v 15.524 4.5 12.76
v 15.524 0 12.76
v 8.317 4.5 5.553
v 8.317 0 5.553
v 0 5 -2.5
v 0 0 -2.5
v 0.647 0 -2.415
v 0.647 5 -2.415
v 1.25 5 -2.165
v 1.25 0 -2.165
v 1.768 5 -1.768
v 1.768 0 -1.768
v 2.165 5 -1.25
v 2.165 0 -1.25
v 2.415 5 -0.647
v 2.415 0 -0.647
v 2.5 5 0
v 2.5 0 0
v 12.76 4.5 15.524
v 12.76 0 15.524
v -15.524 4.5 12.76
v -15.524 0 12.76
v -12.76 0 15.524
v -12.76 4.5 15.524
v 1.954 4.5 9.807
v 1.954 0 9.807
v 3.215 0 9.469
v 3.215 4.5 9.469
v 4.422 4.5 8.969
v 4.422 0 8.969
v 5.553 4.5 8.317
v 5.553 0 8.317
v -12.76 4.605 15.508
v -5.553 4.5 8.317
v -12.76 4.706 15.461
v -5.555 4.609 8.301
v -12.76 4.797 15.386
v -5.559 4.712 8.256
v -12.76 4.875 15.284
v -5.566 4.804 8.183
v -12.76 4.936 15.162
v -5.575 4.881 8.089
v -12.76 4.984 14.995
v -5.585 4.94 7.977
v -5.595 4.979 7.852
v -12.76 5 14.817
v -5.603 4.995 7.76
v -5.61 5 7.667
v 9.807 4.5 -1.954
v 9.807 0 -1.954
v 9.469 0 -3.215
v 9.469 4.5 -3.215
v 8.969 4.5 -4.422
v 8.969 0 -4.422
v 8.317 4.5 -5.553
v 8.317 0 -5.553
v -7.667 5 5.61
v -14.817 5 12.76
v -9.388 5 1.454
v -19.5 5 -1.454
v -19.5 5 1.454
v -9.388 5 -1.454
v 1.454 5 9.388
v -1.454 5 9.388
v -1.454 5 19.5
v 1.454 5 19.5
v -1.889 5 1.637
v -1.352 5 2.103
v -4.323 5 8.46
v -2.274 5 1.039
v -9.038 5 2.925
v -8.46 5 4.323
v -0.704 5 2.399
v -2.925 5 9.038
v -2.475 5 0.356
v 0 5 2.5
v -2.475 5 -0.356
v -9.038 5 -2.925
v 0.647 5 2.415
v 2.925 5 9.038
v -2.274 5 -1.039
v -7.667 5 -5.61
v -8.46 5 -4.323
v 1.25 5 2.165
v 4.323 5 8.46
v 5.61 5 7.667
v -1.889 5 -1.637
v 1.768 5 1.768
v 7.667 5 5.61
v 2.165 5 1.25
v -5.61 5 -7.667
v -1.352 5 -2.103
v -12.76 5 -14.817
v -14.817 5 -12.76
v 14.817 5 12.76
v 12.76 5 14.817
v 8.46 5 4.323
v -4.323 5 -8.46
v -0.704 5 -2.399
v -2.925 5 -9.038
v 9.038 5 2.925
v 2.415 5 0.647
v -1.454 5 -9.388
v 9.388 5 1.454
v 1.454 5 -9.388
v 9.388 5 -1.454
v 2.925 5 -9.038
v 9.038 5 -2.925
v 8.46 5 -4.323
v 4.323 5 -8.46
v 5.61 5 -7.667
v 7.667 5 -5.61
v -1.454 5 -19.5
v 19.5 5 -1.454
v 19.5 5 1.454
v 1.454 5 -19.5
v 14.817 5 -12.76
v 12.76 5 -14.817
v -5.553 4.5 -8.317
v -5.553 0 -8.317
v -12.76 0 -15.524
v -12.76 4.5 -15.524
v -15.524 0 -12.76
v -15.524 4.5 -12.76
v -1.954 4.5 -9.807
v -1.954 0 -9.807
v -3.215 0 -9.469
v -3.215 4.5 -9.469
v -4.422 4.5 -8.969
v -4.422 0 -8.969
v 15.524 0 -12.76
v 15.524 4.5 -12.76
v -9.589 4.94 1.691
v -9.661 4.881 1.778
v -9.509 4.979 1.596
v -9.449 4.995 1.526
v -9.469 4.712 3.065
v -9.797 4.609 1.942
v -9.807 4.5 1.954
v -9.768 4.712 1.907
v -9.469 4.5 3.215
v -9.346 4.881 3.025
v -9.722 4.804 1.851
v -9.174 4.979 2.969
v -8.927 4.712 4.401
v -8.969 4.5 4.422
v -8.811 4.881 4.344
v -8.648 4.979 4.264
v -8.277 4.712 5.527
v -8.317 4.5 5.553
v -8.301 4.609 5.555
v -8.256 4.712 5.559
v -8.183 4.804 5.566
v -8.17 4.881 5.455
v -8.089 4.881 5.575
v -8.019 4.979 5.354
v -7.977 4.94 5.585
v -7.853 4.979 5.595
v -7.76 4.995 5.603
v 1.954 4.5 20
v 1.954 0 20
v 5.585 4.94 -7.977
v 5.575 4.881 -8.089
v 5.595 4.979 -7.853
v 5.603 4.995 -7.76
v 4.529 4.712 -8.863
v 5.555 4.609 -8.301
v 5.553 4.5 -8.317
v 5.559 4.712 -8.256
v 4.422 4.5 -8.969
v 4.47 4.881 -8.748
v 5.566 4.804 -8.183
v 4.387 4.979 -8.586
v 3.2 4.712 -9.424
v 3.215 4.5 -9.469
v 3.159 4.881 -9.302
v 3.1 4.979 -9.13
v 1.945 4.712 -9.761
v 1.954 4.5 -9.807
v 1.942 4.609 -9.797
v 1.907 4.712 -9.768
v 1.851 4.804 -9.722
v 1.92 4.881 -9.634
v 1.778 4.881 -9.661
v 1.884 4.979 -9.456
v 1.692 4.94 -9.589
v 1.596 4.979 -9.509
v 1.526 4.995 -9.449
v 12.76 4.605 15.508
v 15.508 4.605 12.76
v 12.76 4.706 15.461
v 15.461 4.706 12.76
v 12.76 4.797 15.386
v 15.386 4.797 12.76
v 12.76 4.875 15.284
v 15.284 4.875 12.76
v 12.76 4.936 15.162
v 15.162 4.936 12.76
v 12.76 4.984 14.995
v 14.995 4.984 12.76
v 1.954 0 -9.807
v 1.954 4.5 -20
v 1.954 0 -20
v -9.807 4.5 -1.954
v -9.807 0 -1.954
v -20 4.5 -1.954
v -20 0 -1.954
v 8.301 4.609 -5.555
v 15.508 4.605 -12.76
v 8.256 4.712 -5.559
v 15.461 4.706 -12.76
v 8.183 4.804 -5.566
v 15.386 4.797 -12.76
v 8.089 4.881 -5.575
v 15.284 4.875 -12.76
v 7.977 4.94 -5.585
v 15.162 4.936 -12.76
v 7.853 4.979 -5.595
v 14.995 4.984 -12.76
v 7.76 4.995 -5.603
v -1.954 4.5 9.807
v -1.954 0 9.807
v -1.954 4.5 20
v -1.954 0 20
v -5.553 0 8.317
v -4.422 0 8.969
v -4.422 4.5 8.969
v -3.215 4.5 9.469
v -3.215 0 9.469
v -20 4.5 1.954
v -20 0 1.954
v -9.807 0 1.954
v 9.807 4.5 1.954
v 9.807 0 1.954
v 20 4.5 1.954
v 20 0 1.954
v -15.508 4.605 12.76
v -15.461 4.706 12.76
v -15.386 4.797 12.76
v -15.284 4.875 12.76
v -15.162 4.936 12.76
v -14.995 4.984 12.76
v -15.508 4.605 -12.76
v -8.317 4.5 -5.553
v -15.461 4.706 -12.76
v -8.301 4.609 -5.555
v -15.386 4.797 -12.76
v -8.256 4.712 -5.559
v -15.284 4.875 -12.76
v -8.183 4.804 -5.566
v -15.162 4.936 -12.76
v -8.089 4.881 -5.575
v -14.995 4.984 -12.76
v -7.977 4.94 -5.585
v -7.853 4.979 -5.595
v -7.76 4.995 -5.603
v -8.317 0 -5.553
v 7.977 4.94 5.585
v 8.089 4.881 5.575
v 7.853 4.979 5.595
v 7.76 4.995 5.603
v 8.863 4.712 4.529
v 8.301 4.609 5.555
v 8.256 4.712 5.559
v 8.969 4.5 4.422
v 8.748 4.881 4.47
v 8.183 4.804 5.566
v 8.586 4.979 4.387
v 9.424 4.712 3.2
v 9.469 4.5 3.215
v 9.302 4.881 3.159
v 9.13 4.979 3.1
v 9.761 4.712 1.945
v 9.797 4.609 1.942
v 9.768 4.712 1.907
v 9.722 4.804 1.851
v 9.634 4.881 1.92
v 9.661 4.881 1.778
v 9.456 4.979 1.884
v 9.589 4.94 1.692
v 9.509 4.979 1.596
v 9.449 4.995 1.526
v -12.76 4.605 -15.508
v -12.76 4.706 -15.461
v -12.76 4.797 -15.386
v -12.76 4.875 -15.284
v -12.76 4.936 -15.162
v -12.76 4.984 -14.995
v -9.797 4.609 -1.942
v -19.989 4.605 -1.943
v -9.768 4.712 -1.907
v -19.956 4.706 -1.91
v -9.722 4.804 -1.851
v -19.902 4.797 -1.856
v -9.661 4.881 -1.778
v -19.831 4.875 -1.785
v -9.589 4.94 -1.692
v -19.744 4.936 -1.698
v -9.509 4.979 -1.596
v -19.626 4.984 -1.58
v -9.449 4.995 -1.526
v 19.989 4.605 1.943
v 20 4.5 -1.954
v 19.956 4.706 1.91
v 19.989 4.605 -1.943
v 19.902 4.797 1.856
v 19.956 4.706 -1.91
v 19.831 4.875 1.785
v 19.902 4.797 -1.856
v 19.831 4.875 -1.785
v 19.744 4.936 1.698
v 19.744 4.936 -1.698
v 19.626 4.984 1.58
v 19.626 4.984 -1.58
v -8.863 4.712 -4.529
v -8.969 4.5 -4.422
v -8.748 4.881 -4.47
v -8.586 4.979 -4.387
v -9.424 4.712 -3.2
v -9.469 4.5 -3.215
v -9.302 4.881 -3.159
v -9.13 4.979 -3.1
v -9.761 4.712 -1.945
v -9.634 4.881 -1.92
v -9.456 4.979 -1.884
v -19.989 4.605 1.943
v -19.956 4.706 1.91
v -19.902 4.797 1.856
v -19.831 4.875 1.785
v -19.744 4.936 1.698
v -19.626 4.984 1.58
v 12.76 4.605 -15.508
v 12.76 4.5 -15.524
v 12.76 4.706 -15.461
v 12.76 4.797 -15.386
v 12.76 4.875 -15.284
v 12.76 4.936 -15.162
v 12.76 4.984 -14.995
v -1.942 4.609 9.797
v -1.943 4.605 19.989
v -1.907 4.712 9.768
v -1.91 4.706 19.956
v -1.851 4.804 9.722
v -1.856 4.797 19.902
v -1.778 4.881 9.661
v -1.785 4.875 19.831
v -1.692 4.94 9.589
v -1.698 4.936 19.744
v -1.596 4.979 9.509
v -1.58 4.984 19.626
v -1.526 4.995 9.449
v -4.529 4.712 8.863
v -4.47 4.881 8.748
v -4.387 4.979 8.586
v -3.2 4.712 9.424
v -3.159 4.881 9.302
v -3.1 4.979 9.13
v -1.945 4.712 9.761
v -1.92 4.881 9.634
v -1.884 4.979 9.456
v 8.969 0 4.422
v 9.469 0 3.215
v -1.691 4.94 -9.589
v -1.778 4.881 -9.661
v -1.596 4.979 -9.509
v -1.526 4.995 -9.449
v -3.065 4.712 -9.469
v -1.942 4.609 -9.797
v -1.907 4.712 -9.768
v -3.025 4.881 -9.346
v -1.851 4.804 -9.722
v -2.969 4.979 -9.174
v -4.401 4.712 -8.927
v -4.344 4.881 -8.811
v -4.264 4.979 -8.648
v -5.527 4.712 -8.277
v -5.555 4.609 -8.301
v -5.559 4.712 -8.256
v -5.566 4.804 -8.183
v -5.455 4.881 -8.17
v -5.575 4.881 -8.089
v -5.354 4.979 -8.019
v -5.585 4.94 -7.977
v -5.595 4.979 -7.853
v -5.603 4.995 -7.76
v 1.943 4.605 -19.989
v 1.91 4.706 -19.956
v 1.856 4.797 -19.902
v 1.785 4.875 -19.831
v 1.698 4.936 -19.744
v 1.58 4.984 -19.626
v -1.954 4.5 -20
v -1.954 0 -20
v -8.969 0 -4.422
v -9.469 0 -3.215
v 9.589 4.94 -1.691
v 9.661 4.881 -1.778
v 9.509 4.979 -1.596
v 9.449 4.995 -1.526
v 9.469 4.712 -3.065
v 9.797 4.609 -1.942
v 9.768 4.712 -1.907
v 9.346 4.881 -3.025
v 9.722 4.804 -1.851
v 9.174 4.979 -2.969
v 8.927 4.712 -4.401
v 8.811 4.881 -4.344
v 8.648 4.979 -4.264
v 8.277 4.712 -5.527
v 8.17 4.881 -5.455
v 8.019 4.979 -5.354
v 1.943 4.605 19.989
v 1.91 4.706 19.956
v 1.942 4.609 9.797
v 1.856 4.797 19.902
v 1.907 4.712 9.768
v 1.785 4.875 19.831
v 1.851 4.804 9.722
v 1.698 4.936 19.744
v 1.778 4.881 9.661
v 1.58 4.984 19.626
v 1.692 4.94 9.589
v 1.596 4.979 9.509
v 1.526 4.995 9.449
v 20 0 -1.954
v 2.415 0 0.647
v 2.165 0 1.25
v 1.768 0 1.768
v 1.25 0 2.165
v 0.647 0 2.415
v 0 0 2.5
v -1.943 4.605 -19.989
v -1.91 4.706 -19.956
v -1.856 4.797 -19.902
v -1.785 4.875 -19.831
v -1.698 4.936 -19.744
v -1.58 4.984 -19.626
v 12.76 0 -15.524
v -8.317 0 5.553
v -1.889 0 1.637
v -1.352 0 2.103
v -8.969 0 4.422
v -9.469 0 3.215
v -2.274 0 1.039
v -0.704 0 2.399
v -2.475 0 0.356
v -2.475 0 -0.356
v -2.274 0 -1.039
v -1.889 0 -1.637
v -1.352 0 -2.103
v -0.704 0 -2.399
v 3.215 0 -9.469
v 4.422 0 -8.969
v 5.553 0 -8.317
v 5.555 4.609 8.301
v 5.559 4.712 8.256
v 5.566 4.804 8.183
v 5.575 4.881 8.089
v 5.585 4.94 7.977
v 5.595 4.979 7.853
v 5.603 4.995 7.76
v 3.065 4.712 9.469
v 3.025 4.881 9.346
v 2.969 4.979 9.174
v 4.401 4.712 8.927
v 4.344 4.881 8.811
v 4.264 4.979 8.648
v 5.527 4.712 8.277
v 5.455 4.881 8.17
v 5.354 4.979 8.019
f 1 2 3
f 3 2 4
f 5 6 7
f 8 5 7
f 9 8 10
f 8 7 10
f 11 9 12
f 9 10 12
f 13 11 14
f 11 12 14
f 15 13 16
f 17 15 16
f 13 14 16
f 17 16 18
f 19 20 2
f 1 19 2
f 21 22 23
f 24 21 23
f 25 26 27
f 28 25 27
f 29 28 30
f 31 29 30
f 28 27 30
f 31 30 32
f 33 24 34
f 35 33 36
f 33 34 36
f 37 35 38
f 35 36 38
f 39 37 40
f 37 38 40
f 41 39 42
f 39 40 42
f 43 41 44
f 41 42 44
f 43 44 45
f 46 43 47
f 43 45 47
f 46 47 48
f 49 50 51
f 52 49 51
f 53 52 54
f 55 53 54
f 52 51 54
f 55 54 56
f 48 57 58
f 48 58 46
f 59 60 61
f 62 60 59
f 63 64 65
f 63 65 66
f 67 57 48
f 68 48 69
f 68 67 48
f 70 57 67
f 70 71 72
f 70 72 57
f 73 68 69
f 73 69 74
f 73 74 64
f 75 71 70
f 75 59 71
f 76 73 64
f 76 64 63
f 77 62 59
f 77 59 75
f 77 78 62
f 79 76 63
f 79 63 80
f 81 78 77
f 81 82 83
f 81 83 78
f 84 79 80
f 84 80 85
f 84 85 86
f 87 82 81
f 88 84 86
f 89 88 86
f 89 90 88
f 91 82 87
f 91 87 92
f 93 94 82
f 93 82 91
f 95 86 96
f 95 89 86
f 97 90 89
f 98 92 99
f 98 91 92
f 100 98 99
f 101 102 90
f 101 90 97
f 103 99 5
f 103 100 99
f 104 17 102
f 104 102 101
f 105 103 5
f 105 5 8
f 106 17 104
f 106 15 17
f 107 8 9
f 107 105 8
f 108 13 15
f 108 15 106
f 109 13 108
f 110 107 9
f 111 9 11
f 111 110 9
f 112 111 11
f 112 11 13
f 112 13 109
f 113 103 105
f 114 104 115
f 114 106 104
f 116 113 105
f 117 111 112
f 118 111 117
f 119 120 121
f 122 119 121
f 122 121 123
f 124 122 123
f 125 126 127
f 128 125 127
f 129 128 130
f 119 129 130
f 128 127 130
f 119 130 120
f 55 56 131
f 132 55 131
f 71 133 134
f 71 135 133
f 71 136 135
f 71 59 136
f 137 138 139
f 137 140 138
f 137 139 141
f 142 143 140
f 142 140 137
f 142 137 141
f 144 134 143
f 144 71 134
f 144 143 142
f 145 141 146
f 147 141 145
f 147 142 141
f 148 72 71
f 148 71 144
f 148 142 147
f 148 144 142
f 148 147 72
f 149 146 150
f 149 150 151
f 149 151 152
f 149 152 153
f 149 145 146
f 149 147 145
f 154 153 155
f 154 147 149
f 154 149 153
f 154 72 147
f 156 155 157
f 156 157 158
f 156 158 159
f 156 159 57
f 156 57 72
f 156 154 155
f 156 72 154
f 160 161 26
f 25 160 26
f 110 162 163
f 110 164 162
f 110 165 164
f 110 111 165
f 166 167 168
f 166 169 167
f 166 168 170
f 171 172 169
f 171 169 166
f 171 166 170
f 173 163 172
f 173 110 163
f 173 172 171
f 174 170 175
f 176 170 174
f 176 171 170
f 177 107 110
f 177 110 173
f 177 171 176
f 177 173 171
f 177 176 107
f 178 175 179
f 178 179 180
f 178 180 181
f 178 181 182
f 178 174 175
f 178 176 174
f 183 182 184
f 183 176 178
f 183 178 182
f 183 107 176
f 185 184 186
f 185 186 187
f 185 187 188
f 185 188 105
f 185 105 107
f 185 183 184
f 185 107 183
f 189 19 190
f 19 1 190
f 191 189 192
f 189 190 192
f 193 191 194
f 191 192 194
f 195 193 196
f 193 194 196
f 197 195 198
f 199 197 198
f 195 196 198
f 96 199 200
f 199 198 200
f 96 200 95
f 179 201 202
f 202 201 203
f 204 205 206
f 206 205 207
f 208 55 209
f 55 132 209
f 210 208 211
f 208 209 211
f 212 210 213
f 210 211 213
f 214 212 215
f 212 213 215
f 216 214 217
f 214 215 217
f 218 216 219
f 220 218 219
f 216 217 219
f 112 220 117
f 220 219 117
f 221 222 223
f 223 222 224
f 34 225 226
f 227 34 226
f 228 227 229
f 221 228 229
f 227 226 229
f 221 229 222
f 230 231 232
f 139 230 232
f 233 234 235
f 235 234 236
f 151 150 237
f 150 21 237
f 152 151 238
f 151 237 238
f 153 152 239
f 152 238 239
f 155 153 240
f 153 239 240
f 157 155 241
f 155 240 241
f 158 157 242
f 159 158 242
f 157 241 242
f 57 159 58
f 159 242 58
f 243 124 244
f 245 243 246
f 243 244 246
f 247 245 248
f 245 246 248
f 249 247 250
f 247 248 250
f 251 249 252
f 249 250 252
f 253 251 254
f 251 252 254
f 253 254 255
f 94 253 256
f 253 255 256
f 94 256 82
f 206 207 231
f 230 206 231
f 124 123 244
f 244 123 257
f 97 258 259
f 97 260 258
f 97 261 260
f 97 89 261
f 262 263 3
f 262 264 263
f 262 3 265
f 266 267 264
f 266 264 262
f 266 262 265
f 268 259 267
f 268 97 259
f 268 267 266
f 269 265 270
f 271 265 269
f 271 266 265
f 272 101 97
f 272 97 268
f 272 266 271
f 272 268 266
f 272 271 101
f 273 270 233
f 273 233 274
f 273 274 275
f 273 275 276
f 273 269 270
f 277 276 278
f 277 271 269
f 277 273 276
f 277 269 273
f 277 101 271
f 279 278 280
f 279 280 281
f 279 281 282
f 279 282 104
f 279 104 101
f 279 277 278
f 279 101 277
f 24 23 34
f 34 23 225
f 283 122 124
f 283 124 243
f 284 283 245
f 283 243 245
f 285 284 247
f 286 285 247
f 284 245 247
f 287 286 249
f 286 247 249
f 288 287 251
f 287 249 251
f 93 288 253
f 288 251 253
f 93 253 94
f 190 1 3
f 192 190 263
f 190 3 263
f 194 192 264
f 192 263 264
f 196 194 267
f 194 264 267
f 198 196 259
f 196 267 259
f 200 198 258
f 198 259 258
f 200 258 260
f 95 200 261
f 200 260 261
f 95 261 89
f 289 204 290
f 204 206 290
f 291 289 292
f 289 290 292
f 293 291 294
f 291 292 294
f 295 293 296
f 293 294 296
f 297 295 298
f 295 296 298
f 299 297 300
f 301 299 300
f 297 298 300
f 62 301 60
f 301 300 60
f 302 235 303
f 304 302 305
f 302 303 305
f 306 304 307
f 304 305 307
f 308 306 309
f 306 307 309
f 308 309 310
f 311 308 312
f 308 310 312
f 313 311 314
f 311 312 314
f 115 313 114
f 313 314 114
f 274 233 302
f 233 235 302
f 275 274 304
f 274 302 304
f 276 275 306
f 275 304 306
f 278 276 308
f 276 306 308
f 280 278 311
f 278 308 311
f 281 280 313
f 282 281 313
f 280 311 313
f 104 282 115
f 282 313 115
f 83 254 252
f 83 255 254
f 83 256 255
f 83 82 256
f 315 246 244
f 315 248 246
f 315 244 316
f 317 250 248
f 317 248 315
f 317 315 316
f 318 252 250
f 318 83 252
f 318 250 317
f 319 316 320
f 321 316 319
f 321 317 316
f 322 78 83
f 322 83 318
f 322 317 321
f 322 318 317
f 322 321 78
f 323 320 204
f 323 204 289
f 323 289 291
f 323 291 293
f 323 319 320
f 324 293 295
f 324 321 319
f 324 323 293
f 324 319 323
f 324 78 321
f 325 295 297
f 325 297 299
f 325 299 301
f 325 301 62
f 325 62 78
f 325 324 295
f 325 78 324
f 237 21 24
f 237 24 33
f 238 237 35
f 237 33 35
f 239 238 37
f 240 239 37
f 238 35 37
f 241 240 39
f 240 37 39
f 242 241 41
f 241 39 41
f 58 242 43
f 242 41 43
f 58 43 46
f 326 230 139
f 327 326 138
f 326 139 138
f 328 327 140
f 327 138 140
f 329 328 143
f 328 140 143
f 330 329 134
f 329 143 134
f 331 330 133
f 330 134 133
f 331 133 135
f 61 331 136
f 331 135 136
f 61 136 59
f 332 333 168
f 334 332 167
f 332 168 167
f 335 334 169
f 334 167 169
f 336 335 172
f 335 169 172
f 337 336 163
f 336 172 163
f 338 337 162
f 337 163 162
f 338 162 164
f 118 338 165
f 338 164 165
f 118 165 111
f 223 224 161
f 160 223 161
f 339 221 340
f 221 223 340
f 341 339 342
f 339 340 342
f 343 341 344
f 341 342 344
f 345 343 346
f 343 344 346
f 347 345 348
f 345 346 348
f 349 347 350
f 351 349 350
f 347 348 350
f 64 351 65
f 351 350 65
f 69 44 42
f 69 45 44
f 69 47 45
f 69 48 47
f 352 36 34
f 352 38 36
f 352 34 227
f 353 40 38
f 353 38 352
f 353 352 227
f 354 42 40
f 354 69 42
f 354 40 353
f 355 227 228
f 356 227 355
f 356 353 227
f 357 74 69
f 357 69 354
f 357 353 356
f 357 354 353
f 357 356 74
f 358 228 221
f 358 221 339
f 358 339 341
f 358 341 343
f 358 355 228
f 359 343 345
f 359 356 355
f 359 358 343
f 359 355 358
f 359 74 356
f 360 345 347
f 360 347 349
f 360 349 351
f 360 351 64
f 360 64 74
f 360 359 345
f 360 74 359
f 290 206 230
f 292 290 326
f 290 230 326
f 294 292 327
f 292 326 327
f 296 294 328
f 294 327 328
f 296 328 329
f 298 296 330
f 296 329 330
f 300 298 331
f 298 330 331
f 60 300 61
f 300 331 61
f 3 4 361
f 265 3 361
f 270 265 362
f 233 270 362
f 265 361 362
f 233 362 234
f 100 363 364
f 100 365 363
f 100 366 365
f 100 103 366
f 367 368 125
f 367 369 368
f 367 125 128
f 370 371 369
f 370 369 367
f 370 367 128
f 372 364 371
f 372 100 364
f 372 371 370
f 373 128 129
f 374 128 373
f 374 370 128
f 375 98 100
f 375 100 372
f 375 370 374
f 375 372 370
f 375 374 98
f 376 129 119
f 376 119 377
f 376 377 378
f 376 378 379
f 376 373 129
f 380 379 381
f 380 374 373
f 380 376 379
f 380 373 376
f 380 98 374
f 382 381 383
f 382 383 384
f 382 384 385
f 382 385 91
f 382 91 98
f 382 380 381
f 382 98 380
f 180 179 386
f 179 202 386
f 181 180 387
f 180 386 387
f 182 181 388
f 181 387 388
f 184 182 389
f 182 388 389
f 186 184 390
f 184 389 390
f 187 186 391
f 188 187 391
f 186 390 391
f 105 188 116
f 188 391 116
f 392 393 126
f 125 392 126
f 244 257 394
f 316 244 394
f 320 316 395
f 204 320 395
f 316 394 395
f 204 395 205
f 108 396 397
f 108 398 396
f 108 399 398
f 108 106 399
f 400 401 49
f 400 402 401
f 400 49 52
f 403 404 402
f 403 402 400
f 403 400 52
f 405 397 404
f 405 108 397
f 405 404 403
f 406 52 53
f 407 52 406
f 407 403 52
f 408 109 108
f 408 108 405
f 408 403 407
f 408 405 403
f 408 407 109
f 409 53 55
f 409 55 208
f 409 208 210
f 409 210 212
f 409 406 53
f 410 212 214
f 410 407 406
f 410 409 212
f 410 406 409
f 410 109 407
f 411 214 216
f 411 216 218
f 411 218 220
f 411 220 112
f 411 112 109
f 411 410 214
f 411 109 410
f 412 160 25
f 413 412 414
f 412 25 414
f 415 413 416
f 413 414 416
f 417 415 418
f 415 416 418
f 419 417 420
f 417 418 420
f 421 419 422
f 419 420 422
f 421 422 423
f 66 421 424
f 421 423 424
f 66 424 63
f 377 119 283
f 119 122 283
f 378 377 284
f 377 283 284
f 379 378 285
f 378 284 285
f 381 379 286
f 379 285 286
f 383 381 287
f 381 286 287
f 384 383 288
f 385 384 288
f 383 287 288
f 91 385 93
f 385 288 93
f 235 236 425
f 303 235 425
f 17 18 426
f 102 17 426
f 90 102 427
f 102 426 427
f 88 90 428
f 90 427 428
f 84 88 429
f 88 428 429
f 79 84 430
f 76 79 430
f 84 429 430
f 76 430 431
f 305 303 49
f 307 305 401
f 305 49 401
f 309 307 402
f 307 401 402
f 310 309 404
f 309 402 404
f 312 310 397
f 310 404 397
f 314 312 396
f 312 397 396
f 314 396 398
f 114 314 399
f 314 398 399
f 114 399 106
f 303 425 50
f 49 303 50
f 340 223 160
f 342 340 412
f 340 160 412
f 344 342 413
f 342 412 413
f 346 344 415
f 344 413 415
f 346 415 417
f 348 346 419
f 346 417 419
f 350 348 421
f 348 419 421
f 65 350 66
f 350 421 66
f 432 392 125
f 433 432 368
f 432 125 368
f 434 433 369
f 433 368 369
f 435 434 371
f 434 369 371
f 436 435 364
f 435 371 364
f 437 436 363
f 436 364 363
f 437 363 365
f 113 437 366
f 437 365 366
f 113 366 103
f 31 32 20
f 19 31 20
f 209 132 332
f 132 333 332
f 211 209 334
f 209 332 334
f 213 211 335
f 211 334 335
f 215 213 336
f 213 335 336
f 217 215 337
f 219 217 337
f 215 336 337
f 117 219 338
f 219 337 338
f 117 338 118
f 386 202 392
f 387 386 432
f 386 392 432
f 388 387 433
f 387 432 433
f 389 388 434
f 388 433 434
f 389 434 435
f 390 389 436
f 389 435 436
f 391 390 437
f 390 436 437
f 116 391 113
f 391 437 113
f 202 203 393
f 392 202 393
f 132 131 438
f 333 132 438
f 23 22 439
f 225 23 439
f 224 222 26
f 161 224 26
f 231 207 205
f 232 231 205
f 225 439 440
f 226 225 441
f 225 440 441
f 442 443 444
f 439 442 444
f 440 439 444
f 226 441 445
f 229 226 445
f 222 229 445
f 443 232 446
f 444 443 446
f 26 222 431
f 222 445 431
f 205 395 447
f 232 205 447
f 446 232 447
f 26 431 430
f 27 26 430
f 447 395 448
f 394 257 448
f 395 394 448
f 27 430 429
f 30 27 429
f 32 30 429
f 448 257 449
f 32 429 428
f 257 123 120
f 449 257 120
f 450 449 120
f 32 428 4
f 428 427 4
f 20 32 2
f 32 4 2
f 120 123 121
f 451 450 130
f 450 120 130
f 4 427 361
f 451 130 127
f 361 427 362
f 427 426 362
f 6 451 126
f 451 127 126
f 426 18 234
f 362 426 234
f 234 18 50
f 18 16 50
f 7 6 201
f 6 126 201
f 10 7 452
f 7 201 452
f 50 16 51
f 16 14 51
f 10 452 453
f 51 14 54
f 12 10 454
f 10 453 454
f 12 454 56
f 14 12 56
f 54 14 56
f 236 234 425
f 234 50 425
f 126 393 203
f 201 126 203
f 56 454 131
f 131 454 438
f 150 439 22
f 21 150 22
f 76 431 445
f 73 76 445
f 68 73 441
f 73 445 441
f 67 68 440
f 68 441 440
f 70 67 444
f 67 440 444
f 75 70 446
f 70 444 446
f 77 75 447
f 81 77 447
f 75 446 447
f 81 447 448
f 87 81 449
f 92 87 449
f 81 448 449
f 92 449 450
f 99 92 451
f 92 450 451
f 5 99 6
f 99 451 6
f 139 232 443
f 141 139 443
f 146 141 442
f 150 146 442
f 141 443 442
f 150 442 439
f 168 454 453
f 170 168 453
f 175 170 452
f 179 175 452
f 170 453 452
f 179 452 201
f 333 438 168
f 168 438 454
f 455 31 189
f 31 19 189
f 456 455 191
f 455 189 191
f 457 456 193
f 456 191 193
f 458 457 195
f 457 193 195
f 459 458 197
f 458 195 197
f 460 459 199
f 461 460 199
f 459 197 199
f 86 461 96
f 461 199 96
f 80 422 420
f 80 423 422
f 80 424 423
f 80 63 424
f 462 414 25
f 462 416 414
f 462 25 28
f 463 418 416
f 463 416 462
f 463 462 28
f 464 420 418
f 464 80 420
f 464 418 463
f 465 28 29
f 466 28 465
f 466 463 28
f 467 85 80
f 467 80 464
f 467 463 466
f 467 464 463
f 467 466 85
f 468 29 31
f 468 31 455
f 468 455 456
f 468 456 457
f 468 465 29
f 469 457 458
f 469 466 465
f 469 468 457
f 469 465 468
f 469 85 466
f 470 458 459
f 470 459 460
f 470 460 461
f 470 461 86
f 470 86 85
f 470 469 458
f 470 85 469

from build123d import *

# Parameters (mm, degrees)
EXTRUDE_1_DEPTH = 5
FILLET_1_R      = 0.5


with BuildPart() as part:
    # 草图1 → 凸台-拉伸1 (new body)
    with BuildSketch(Plane(origin=(0, 0, 0), x_dir=(1, 0, 0), z_dir=(0, 1, 0))):
        with BuildLine():
            ThreePointArc((-8.316516862, 5.552976435), (-7.071067812, 7.071067812), (-5.552976435, 8.316516862))
            Line((-5.552976435, 8.316516862), (-12.76036541, 15.523905838))
            Line((-12.76036541, 15.523905838), (-15.523905838, 12.76036541))
            Line((-15.523905838, 12.76036541), (-8.316516862, 5.552976435))
        make_face()
        with BuildLine():
            Line((-20, -1.954118176), (-9.807212762, -1.954118176))
            ThreePointArc((-9.807212762, -1.954118176), (-10, 0), (-9.807212762, 1.954118176))
            Line((-9.807212762, 1.954118176), (-20, 1.954118176))
            Line((-20, 1.954118176), (-20, -1.954118176))
        make_face()
        with BuildLine():
            Line((-12.76036541, -15.523905838), (-5.552976435, -8.316516862))
            ThreePointArc((-5.552976435, -8.316516862), (-7.071067812, -7.071067812), (-8.316516862, -5.552976435))
            Line((-8.316516862, -5.552976435), (-15.523905838, -12.76036541))
            Line((-15.523905838, -12.76036541), (-12.76036541, -15.523905838))
        make_face()
        with BuildLine():
            ThreePointArc((-1.954118176, -9.807212762), (-0.981802522, -9.951686481), (0, -10))
            Line((0, -10), (0, -2.5))
            ThreePointArc((0, -2.5), (-2.5, 0), (0, 2.5))
            Line((0, 2.5), (0, 10))
            ThreePointArc((0, 10), (-0.981802522, 9.951686481), (-1.954118176, 9.807212762))
            ThreePointArc((-1.954118176, 9.807212762), (-3.826834324, 9.238795325), (-5.552976435, 8.316516862))
            ThreePointArc((-5.552976435, 8.316516862), (-7.071067812, 7.071067812), (-8.316516862, 5.552976435))
            ThreePointArc((-8.316516862, 5.552976435), (-9.238795325, 3.826834324), (-9.807212762, 1.954118176))
            ThreePointArc((-9.807212762, 1.954118176), (-10, 0), (-9.807212762, -1.954118176))
            ThreePointArc((-9.807212762, -1.954118176), (-9.238795325, -3.826834324), (-8.316516862, -5.552976435))
            ThreePointArc((-8.316516862, -5.552976435), (-7.071067812, -7.071067812), (-5.552976435, -8.316516862))
            ThreePointArc((-5.552976435, -8.316516862), (-3.826834324, -9.238795325), (-1.954118176, -9.807212762))
        make_face()
        with BuildLine():
            Line((0, -2.5), (0, -10))
            ThreePointArc((0, -10), (0.981802522, -9.951686481), (1.954118176, -9.807212762))
            ThreePointArc((1.954118176, -9.807212762), (3.826834324, -9.238795325), (5.552976435, -8.316516862))
            ThreePointArc((5.552976435, -8.316516862), (7.071067812, -7.071067812), (8.316516862, -5.552976435))
            ThreePointArc((8.316516862, -5.552976435), (9.238795325, -3.826834324), (9.807212762, -1.954118176))
            ThreePointArc((9.807212762, -1.954118176), (9.951686481, -0.981802522), (10, 0))
            ThreePointArc((10, 0), (9.951686481, 0.981802522), (9.807212762, 1.954118176))
            ThreePointArc((9.807212762, 1.954118176), (9.238795325, 3.826834324), (8.316516862, 5.552976435))
            ThreePointArc((8.316516862, 5.552976435), (7.071067812, 7.071067812), (5.552976435, 8.316516862))
            ThreePointArc((5.552976435, 8.316516862), (3.826834324, 9.238795325), (1.954118176, 9.807212762))
            ThreePointArc((1.954118176, 9.807212762), (0.981802522, 9.951686481), (0, 10))
            Line((0, 10), (0, 2.5))
            ThreePointArc((0, 2.5), (1.767766953, 1.767766953), (2.5, 0))
            ThreePointArc((2.5, 0), (1.767766953, -1.767766953), (0, -2.5))
        make_face()
        with BuildLine():
            Line((0, 20), (0, 10))
            ThreePointArc((0, 10), (0.981802522, 9.951686481), (1.954118176, 9.807212762))
            Line((1.954118176, 9.807212762), (1.954118176, 20))
            Line((1.954118176, 20), (0, 20))
        make_face()
        with BuildLine():
            ThreePointArc((-1.954118176, 9.807212762), (-0.981802522, 9.951686481), (0, 10))
            Line((0, 10), (0, 20))
            Line((0, 20), (-1.954118176, 20))
            Line((-1.954118176, 20), (-1.954118176, 9.807212762))
        make_face()
        with BuildLine():
            Line((12.76036541, 15.523905838), (5.552976435, 8.316516862))
            ThreePointArc((5.552976435, 8.316516862), (7.071067812, 7.071067812), (8.316516862, 5.552976435))
            Line((8.316516862, 5.552976435), (15.523905838, 12.76036541))
            Line((15.523905838, 12.76036541), (12.76036541, 15.523905838))
        make_face()
        with BuildLine():
            ThreePointArc((10, 0), (9.951686481, -0.981802522), (9.807212762, -1.954118176))
            Line((9.807212762, -1.954118176), (20, -1.954118176))
            Line((20, -1.954118176), (20, 1.954118176))
            Line((20, 1.954118176), (9.807212762, 1.954118176))
            ThreePointArc((9.807212762, 1.954118176), (9.951686481, 0.981802522), (10, 0))
        make_face()
        with BuildLine():
            ThreePointArc((8.316516862, -5.552976435), (7.071067812, -7.071067812), (5.552976435, -8.316516862))
            Line((5.552976435, -8.316516862), (12.76036541, -15.523905838))
            Line((12.76036541, -15.523905838), (15.523905838, -12.76036541))
            Line((15.523905838, -12.76036541), (8.316516862, -5.552976435))
        make_face()
        with BuildLine():
            Line((-1.954118176, -20), (0, -20))
            Line((0, -20), (0, -10))
            ThreePointArc((0, -10), (-0.981802522, -9.951686481), (-1.954118176, -9.807212762))
            Line((-1.954118176, -9.807212762), (-1.954118176, -20))
        make_face()
        with BuildLine():
            Line((0, -10), (0, -20))
            Line((0, -20), (1.954118176, -20))
            Line((1.954118176, -20), (1.954118176, -9.807212762))
            ThreePointArc((1.954118176, -9.807212762), (0.981802522, -9.951686481), (0, -10))
        make_face()
    extrude(amount=EXTRUDE_1_DEPTH)

    # 圆角1
    fillet_1_edges = [part.edges().sort_by_distance(p)[0] for p in [
        (9.156670922, 5, 11.92021135),
        (14.142135624, 5, 14.142135624),
        (0, 5, -20),
        (11.92021135, 5, 9.156670922),
        (9.238795325, 5, 3.826834324),
        (14.903606381, 5, 1.954118176),
        (20, 5, 0),
        (14.903606381, 5, -1.954118176),
        (9.238795325, 5, -3.826834324),
        (11.92021135, 5, -9.156670922),
        (14.142135624, 5, -14.142135624),
        (9.156670922, 5, -11.92021135),
        (3.826834324, 5, -9.238795325),
        (-1.954118176, 5, -14.903606381),
        (-3.826834324, 5, -9.238795325),
        (-9.156670922, 5, -11.92021135),
        (-14.142135624, 5, -14.142135624),
        (-11.92021135, 5, -9.156670922),
        (-9.238795325, 5, -3.826834324),
        (-14.903606381, 5, -1.954118176),
        (-20, 5, 0),
        (-14.903606381, 5, 1.954118176),
        (1.954118176, 5, -14.903606381),
        (-9.238795325, 5, 3.826834324),
        (-11.92021135, 5, 9.156670922),
        (-14.142135624, 5, 14.142135624),
        (-9.156670922, 5, 11.92021135),
        (-3.826834324, 5, 9.238795325),
        (-1.954118176, 5, 14.903606381),
        (0, 5, 20),
        (1.954118176, 5, 14.903606381),
        (3.826834324, 5, 9.238795325),
    ]]
    fillet(fillet_1_edges, radius=FILLET_1_R)


solid = part.part
